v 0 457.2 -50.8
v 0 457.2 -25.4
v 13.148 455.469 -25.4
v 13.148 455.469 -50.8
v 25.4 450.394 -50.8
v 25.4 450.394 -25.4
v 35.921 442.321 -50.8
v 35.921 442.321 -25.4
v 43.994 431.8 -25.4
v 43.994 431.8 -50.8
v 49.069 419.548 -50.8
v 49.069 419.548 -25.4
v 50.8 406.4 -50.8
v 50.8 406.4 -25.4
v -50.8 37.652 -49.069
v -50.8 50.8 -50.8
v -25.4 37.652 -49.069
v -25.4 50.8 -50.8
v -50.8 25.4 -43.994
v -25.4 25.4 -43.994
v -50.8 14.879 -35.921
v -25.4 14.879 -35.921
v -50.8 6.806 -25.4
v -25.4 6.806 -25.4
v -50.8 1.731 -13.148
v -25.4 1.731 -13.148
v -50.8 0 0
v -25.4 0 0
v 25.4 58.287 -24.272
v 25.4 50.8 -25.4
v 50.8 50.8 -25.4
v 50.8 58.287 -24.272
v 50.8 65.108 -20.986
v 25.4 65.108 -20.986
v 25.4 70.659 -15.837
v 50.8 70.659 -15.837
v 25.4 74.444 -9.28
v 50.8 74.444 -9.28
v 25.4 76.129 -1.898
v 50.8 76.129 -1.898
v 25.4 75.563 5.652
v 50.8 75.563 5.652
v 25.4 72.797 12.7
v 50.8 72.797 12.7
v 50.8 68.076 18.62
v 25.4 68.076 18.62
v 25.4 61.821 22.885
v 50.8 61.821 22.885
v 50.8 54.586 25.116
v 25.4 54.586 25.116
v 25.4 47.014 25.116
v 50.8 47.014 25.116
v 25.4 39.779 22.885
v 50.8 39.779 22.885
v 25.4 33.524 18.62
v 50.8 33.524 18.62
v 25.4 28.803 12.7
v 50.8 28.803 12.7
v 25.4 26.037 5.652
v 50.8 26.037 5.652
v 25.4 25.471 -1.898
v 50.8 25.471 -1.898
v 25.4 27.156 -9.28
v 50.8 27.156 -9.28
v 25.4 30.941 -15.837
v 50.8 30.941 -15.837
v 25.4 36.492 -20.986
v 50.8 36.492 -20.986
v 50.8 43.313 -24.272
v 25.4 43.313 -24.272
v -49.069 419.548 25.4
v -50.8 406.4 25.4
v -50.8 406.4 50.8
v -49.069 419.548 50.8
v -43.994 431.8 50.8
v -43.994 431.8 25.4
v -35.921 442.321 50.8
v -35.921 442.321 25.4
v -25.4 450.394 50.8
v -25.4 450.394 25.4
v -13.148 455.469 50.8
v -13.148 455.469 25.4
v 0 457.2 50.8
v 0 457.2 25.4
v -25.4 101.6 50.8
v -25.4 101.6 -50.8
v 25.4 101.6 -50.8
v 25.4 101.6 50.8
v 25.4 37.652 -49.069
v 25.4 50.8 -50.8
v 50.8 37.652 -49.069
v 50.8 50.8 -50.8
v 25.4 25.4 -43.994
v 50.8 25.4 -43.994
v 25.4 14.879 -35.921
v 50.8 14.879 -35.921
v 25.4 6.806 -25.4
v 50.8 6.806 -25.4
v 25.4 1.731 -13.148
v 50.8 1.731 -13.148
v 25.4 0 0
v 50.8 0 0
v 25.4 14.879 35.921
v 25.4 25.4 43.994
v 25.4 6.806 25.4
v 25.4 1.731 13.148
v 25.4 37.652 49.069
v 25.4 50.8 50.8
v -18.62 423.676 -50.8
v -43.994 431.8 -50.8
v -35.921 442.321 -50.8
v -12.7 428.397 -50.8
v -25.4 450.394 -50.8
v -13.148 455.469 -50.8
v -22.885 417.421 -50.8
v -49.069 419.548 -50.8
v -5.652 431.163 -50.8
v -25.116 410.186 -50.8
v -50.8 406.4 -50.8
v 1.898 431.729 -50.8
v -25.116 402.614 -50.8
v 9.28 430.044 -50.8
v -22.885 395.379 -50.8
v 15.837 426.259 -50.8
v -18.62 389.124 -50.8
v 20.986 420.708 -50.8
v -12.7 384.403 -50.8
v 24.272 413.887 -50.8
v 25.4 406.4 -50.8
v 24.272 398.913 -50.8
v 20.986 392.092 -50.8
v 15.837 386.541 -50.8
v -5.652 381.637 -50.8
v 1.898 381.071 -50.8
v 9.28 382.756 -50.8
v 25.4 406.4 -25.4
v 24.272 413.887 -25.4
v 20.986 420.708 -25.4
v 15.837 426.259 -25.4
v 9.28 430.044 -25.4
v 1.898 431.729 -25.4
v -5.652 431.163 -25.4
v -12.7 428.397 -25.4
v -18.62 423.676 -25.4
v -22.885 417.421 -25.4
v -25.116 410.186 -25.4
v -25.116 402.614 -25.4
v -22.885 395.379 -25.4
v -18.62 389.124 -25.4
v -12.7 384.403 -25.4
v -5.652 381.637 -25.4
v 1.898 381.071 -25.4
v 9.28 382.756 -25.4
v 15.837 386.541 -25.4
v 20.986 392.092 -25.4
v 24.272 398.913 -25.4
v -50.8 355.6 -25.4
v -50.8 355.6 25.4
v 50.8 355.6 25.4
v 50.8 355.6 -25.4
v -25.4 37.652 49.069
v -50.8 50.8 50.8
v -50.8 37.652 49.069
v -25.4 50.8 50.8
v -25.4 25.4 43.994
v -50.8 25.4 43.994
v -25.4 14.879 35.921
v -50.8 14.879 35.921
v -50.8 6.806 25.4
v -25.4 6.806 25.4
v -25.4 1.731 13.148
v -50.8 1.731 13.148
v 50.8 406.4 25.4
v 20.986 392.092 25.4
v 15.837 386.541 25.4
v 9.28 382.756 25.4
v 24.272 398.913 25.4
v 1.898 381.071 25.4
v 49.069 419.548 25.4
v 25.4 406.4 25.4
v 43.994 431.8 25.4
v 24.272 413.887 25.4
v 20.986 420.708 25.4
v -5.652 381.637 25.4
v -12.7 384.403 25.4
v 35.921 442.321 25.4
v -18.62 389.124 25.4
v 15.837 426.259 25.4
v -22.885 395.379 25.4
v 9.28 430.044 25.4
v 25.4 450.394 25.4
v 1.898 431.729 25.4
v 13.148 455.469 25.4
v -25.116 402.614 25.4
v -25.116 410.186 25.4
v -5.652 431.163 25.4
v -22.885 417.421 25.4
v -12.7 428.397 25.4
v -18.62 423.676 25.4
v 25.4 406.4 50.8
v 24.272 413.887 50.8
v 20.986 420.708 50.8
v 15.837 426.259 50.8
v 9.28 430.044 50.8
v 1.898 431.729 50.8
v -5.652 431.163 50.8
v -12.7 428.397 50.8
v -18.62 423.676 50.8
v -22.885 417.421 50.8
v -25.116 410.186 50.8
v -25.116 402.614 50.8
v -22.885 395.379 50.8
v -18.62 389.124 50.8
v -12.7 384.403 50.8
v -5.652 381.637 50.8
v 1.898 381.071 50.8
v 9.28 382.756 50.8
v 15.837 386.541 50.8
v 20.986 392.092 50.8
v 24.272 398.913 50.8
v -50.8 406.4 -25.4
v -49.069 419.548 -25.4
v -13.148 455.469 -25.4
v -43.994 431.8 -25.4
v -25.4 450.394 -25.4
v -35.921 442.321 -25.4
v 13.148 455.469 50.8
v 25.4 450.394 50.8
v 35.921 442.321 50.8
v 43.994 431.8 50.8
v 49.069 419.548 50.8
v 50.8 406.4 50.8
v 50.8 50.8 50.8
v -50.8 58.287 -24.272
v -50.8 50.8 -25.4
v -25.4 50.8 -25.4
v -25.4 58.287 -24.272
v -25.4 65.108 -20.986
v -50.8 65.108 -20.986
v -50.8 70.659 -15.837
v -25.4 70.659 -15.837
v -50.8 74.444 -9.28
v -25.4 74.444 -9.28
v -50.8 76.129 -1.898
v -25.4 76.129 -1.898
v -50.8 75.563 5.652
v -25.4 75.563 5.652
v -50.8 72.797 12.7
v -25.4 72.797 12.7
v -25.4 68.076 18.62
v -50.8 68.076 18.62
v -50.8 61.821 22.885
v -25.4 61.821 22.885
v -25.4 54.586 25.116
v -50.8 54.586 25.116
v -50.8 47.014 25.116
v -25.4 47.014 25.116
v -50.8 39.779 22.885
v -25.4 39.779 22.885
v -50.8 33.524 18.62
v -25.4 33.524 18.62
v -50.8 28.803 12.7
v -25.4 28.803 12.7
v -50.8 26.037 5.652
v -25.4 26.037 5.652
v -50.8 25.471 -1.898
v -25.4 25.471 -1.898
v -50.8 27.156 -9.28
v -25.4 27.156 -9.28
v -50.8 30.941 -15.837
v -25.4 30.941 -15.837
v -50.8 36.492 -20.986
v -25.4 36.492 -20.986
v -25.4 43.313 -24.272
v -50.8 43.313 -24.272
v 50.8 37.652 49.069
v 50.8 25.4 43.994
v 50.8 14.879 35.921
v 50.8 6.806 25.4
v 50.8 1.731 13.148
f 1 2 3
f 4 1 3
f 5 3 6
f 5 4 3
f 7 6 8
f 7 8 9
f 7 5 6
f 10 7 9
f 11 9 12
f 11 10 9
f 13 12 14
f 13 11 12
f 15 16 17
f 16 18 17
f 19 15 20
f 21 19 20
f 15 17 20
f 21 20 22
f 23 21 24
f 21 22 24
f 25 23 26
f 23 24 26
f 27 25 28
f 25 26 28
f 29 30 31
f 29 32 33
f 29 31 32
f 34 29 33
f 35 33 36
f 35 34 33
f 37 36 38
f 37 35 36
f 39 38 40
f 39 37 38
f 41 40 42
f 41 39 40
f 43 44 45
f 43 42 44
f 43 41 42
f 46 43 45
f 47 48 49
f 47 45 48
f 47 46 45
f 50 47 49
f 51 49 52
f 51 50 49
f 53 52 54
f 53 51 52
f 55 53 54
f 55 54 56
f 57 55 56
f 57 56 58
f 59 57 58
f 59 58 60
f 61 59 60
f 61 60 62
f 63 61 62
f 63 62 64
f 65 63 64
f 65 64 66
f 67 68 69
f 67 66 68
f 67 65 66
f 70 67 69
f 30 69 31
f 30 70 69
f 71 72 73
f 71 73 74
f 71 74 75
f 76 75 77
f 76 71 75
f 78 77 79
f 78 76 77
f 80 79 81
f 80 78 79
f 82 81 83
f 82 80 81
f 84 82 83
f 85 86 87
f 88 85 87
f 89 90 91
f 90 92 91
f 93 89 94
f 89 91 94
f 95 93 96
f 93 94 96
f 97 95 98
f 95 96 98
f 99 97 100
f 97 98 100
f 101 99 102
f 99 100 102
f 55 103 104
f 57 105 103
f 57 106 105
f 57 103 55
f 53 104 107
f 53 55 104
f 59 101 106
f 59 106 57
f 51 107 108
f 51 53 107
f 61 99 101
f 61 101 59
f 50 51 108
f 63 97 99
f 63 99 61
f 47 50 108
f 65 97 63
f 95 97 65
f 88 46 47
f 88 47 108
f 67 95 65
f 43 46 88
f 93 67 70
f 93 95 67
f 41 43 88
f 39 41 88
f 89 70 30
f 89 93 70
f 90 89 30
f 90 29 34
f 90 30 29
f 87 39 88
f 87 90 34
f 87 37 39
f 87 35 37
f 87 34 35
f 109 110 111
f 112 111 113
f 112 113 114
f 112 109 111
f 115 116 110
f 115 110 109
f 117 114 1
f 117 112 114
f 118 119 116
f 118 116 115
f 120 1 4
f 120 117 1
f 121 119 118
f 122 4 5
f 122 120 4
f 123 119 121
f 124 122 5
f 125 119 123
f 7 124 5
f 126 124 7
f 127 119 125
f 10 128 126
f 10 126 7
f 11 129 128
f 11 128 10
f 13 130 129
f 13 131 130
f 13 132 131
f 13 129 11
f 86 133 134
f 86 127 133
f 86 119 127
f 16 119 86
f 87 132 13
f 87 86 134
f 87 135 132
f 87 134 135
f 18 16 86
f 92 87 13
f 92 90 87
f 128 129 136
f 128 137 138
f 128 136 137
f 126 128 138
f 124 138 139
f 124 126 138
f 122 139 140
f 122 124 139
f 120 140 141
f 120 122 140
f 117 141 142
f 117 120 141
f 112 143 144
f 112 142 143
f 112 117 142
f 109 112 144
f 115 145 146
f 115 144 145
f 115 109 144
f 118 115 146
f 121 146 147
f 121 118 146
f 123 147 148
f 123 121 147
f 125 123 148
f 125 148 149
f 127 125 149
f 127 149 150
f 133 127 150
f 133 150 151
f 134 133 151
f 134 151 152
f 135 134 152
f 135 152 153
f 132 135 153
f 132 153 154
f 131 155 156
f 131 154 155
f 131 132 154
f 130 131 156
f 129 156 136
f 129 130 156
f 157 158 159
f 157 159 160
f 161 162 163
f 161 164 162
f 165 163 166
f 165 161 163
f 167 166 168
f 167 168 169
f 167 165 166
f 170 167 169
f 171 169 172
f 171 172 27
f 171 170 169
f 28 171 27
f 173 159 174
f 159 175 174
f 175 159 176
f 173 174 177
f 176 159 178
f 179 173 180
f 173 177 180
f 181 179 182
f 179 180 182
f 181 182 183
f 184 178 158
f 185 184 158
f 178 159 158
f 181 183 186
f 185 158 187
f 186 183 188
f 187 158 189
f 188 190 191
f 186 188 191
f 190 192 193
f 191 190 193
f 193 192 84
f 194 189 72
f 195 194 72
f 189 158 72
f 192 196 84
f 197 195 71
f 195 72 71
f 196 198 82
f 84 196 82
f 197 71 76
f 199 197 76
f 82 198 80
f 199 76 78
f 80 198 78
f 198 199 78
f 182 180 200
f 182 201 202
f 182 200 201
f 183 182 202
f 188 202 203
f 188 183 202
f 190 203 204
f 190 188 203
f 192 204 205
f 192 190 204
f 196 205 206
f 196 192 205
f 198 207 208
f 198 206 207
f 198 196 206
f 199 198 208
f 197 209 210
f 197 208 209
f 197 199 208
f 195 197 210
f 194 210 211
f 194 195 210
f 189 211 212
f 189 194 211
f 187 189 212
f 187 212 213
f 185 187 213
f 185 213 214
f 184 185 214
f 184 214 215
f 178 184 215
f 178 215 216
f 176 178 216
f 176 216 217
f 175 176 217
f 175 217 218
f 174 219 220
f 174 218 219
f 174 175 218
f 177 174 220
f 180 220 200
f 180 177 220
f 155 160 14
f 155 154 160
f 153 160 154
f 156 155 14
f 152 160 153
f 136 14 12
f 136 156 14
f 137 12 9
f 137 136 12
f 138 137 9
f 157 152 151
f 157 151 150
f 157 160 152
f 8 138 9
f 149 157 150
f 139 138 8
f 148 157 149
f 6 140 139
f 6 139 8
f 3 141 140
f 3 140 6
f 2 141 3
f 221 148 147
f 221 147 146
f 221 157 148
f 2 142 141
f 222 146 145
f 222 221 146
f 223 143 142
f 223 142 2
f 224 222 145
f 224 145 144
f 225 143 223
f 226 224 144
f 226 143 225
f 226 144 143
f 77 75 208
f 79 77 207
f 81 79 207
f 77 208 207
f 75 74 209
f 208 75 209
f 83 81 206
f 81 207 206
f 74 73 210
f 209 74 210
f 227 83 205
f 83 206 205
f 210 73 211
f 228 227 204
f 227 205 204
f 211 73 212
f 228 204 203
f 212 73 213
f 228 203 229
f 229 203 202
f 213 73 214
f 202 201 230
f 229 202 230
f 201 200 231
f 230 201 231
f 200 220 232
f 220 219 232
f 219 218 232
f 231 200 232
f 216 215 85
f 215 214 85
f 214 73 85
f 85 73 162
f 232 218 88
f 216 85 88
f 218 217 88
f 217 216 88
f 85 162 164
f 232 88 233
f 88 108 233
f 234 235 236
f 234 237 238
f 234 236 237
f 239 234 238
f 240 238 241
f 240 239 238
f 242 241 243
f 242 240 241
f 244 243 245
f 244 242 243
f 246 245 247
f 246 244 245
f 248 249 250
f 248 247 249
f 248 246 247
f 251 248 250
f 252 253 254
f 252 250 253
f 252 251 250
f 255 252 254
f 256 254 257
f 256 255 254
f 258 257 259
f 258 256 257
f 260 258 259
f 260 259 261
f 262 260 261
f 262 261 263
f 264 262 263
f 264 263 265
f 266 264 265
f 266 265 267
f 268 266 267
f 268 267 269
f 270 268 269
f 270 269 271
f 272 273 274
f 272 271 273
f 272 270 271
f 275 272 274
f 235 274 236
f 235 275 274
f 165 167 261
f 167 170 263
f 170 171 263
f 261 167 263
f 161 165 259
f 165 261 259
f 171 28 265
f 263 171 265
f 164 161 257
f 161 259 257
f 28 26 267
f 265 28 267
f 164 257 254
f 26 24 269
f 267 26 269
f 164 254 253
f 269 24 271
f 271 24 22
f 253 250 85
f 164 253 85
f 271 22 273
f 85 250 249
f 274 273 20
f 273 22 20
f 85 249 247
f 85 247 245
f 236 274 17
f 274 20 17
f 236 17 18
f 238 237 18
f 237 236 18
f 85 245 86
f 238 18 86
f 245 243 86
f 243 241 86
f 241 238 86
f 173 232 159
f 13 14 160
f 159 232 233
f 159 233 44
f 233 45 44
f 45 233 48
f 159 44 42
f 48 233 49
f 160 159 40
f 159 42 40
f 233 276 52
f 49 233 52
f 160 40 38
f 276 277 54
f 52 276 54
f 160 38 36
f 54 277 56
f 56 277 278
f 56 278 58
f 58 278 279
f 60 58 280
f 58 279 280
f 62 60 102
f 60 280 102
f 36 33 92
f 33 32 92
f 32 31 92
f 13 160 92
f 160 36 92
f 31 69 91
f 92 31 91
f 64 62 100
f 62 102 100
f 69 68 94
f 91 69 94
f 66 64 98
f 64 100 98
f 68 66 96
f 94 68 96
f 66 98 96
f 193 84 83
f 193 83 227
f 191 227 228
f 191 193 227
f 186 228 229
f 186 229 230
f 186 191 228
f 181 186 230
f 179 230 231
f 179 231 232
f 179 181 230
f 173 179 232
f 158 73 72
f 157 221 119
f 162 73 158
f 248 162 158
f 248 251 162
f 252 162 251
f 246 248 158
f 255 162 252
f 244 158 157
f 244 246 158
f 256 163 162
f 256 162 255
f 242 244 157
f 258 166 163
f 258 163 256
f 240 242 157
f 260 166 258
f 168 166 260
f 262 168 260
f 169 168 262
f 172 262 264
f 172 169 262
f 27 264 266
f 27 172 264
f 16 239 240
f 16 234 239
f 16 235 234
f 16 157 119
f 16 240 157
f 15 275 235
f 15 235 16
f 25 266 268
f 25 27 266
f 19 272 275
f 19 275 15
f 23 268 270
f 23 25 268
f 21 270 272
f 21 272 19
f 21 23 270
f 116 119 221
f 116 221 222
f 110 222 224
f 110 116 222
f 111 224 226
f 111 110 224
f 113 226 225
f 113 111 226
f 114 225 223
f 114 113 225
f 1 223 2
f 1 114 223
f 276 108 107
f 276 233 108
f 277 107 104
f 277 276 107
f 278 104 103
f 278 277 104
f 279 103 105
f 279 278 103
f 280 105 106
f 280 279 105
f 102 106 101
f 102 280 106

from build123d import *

# Parameters (mm, degrees)
SKETCH2_W               = 101.6
SKETCH2_H               = 101.6
BOSS_EXTRUDE1_DEPTH     = 457.2
CUT_EXTRUDE1_DEPTH      = 463.810025821
CUT_EXTRUDE1_DEPTH_BACK = 463.810025821
SKETCH3_R               = 25.4
SKETCH3_W               = 50.8
SKETCH3_H               = 101.6
FILLET1_R               = 50.8
CUT_EXTRUDE2_DEPTH      = 472.099819571
CUT_EXTRUDE2_DEPTH_BACK = 472.099819571
SKETCH4_R               = 25.4
SKETCH4_W               = 50.8
SKETCH4_H               = 101.6


with BuildPart() as part:
    # Sketch2 → Boss-Extrude1 (new body)
    with BuildSketch(Plane(origin=(0, 0, 0), x_dir=(1, 0, 0), z_dir=(0, 1, 0))):
        Rectangle(SKETCH2_W, SKETCH2_H)
    extrude(amount=BOSS_EXTRUDE1_DEPTH)

    # Sketch3 → Cut-Extrude1 (cut, two sides: drawn at the far end of the back side and taken through both)
    with BuildSketch(Plane.XY.offset(-CUT_EXTRUDE1_DEPTH_BACK)):
        with Locations((0, 406.4)):
            Circle(SKETCH3_R)
        with Locations((0, 50.8)):
            Rectangle(SKETCH3_W, SKETCH3_H)
    extrude(amount=CUT_EXTRUDE1_DEPTH + CUT_EXTRUDE1_DEPTH_BACK, mode=Mode.SUBTRACT)

    # Fillet1
    fillet1_edges = [part.edges().sort_by_distance(p)[0] for p in [
        (-38.1, 0, -50.8),
        (-38.1, 0, 50.8),
        (38.1, 0, -50.8),
        (38.1, 0, 50.8),
        (-50.8, 457.2, 0),
        (50.8, 457.2, 0),
    ]]
    fillet(fillet1_edges, radius=FILLET1_R - 0.0001)  # a hair under: the kernel refuses the full size

    # Sketch4 → Cut-Extrude2 (cut, two sides: drawn at the far end of the back side and taken through both)
    with BuildSketch(Plane(origin=(50.8, 0, 0), x_dir=(0, 0, -1), z_dir=(1, 0, 0)).offset(-CUT_EXTRUDE2_DEPTH_BACK)):
        with Locations((0, 50.8)):
            Circle(SKETCH4_R)
        with Locations((0, 406.4)):
            Rectangle(SKETCH4_W, SKETCH4_H)
    extrude(amount=CUT_EXTRUDE2_DEPTH + CUT_EXTRUDE2_DEPTH_BACK, mode=Mode.SUBTRACT)


solid = part.part
